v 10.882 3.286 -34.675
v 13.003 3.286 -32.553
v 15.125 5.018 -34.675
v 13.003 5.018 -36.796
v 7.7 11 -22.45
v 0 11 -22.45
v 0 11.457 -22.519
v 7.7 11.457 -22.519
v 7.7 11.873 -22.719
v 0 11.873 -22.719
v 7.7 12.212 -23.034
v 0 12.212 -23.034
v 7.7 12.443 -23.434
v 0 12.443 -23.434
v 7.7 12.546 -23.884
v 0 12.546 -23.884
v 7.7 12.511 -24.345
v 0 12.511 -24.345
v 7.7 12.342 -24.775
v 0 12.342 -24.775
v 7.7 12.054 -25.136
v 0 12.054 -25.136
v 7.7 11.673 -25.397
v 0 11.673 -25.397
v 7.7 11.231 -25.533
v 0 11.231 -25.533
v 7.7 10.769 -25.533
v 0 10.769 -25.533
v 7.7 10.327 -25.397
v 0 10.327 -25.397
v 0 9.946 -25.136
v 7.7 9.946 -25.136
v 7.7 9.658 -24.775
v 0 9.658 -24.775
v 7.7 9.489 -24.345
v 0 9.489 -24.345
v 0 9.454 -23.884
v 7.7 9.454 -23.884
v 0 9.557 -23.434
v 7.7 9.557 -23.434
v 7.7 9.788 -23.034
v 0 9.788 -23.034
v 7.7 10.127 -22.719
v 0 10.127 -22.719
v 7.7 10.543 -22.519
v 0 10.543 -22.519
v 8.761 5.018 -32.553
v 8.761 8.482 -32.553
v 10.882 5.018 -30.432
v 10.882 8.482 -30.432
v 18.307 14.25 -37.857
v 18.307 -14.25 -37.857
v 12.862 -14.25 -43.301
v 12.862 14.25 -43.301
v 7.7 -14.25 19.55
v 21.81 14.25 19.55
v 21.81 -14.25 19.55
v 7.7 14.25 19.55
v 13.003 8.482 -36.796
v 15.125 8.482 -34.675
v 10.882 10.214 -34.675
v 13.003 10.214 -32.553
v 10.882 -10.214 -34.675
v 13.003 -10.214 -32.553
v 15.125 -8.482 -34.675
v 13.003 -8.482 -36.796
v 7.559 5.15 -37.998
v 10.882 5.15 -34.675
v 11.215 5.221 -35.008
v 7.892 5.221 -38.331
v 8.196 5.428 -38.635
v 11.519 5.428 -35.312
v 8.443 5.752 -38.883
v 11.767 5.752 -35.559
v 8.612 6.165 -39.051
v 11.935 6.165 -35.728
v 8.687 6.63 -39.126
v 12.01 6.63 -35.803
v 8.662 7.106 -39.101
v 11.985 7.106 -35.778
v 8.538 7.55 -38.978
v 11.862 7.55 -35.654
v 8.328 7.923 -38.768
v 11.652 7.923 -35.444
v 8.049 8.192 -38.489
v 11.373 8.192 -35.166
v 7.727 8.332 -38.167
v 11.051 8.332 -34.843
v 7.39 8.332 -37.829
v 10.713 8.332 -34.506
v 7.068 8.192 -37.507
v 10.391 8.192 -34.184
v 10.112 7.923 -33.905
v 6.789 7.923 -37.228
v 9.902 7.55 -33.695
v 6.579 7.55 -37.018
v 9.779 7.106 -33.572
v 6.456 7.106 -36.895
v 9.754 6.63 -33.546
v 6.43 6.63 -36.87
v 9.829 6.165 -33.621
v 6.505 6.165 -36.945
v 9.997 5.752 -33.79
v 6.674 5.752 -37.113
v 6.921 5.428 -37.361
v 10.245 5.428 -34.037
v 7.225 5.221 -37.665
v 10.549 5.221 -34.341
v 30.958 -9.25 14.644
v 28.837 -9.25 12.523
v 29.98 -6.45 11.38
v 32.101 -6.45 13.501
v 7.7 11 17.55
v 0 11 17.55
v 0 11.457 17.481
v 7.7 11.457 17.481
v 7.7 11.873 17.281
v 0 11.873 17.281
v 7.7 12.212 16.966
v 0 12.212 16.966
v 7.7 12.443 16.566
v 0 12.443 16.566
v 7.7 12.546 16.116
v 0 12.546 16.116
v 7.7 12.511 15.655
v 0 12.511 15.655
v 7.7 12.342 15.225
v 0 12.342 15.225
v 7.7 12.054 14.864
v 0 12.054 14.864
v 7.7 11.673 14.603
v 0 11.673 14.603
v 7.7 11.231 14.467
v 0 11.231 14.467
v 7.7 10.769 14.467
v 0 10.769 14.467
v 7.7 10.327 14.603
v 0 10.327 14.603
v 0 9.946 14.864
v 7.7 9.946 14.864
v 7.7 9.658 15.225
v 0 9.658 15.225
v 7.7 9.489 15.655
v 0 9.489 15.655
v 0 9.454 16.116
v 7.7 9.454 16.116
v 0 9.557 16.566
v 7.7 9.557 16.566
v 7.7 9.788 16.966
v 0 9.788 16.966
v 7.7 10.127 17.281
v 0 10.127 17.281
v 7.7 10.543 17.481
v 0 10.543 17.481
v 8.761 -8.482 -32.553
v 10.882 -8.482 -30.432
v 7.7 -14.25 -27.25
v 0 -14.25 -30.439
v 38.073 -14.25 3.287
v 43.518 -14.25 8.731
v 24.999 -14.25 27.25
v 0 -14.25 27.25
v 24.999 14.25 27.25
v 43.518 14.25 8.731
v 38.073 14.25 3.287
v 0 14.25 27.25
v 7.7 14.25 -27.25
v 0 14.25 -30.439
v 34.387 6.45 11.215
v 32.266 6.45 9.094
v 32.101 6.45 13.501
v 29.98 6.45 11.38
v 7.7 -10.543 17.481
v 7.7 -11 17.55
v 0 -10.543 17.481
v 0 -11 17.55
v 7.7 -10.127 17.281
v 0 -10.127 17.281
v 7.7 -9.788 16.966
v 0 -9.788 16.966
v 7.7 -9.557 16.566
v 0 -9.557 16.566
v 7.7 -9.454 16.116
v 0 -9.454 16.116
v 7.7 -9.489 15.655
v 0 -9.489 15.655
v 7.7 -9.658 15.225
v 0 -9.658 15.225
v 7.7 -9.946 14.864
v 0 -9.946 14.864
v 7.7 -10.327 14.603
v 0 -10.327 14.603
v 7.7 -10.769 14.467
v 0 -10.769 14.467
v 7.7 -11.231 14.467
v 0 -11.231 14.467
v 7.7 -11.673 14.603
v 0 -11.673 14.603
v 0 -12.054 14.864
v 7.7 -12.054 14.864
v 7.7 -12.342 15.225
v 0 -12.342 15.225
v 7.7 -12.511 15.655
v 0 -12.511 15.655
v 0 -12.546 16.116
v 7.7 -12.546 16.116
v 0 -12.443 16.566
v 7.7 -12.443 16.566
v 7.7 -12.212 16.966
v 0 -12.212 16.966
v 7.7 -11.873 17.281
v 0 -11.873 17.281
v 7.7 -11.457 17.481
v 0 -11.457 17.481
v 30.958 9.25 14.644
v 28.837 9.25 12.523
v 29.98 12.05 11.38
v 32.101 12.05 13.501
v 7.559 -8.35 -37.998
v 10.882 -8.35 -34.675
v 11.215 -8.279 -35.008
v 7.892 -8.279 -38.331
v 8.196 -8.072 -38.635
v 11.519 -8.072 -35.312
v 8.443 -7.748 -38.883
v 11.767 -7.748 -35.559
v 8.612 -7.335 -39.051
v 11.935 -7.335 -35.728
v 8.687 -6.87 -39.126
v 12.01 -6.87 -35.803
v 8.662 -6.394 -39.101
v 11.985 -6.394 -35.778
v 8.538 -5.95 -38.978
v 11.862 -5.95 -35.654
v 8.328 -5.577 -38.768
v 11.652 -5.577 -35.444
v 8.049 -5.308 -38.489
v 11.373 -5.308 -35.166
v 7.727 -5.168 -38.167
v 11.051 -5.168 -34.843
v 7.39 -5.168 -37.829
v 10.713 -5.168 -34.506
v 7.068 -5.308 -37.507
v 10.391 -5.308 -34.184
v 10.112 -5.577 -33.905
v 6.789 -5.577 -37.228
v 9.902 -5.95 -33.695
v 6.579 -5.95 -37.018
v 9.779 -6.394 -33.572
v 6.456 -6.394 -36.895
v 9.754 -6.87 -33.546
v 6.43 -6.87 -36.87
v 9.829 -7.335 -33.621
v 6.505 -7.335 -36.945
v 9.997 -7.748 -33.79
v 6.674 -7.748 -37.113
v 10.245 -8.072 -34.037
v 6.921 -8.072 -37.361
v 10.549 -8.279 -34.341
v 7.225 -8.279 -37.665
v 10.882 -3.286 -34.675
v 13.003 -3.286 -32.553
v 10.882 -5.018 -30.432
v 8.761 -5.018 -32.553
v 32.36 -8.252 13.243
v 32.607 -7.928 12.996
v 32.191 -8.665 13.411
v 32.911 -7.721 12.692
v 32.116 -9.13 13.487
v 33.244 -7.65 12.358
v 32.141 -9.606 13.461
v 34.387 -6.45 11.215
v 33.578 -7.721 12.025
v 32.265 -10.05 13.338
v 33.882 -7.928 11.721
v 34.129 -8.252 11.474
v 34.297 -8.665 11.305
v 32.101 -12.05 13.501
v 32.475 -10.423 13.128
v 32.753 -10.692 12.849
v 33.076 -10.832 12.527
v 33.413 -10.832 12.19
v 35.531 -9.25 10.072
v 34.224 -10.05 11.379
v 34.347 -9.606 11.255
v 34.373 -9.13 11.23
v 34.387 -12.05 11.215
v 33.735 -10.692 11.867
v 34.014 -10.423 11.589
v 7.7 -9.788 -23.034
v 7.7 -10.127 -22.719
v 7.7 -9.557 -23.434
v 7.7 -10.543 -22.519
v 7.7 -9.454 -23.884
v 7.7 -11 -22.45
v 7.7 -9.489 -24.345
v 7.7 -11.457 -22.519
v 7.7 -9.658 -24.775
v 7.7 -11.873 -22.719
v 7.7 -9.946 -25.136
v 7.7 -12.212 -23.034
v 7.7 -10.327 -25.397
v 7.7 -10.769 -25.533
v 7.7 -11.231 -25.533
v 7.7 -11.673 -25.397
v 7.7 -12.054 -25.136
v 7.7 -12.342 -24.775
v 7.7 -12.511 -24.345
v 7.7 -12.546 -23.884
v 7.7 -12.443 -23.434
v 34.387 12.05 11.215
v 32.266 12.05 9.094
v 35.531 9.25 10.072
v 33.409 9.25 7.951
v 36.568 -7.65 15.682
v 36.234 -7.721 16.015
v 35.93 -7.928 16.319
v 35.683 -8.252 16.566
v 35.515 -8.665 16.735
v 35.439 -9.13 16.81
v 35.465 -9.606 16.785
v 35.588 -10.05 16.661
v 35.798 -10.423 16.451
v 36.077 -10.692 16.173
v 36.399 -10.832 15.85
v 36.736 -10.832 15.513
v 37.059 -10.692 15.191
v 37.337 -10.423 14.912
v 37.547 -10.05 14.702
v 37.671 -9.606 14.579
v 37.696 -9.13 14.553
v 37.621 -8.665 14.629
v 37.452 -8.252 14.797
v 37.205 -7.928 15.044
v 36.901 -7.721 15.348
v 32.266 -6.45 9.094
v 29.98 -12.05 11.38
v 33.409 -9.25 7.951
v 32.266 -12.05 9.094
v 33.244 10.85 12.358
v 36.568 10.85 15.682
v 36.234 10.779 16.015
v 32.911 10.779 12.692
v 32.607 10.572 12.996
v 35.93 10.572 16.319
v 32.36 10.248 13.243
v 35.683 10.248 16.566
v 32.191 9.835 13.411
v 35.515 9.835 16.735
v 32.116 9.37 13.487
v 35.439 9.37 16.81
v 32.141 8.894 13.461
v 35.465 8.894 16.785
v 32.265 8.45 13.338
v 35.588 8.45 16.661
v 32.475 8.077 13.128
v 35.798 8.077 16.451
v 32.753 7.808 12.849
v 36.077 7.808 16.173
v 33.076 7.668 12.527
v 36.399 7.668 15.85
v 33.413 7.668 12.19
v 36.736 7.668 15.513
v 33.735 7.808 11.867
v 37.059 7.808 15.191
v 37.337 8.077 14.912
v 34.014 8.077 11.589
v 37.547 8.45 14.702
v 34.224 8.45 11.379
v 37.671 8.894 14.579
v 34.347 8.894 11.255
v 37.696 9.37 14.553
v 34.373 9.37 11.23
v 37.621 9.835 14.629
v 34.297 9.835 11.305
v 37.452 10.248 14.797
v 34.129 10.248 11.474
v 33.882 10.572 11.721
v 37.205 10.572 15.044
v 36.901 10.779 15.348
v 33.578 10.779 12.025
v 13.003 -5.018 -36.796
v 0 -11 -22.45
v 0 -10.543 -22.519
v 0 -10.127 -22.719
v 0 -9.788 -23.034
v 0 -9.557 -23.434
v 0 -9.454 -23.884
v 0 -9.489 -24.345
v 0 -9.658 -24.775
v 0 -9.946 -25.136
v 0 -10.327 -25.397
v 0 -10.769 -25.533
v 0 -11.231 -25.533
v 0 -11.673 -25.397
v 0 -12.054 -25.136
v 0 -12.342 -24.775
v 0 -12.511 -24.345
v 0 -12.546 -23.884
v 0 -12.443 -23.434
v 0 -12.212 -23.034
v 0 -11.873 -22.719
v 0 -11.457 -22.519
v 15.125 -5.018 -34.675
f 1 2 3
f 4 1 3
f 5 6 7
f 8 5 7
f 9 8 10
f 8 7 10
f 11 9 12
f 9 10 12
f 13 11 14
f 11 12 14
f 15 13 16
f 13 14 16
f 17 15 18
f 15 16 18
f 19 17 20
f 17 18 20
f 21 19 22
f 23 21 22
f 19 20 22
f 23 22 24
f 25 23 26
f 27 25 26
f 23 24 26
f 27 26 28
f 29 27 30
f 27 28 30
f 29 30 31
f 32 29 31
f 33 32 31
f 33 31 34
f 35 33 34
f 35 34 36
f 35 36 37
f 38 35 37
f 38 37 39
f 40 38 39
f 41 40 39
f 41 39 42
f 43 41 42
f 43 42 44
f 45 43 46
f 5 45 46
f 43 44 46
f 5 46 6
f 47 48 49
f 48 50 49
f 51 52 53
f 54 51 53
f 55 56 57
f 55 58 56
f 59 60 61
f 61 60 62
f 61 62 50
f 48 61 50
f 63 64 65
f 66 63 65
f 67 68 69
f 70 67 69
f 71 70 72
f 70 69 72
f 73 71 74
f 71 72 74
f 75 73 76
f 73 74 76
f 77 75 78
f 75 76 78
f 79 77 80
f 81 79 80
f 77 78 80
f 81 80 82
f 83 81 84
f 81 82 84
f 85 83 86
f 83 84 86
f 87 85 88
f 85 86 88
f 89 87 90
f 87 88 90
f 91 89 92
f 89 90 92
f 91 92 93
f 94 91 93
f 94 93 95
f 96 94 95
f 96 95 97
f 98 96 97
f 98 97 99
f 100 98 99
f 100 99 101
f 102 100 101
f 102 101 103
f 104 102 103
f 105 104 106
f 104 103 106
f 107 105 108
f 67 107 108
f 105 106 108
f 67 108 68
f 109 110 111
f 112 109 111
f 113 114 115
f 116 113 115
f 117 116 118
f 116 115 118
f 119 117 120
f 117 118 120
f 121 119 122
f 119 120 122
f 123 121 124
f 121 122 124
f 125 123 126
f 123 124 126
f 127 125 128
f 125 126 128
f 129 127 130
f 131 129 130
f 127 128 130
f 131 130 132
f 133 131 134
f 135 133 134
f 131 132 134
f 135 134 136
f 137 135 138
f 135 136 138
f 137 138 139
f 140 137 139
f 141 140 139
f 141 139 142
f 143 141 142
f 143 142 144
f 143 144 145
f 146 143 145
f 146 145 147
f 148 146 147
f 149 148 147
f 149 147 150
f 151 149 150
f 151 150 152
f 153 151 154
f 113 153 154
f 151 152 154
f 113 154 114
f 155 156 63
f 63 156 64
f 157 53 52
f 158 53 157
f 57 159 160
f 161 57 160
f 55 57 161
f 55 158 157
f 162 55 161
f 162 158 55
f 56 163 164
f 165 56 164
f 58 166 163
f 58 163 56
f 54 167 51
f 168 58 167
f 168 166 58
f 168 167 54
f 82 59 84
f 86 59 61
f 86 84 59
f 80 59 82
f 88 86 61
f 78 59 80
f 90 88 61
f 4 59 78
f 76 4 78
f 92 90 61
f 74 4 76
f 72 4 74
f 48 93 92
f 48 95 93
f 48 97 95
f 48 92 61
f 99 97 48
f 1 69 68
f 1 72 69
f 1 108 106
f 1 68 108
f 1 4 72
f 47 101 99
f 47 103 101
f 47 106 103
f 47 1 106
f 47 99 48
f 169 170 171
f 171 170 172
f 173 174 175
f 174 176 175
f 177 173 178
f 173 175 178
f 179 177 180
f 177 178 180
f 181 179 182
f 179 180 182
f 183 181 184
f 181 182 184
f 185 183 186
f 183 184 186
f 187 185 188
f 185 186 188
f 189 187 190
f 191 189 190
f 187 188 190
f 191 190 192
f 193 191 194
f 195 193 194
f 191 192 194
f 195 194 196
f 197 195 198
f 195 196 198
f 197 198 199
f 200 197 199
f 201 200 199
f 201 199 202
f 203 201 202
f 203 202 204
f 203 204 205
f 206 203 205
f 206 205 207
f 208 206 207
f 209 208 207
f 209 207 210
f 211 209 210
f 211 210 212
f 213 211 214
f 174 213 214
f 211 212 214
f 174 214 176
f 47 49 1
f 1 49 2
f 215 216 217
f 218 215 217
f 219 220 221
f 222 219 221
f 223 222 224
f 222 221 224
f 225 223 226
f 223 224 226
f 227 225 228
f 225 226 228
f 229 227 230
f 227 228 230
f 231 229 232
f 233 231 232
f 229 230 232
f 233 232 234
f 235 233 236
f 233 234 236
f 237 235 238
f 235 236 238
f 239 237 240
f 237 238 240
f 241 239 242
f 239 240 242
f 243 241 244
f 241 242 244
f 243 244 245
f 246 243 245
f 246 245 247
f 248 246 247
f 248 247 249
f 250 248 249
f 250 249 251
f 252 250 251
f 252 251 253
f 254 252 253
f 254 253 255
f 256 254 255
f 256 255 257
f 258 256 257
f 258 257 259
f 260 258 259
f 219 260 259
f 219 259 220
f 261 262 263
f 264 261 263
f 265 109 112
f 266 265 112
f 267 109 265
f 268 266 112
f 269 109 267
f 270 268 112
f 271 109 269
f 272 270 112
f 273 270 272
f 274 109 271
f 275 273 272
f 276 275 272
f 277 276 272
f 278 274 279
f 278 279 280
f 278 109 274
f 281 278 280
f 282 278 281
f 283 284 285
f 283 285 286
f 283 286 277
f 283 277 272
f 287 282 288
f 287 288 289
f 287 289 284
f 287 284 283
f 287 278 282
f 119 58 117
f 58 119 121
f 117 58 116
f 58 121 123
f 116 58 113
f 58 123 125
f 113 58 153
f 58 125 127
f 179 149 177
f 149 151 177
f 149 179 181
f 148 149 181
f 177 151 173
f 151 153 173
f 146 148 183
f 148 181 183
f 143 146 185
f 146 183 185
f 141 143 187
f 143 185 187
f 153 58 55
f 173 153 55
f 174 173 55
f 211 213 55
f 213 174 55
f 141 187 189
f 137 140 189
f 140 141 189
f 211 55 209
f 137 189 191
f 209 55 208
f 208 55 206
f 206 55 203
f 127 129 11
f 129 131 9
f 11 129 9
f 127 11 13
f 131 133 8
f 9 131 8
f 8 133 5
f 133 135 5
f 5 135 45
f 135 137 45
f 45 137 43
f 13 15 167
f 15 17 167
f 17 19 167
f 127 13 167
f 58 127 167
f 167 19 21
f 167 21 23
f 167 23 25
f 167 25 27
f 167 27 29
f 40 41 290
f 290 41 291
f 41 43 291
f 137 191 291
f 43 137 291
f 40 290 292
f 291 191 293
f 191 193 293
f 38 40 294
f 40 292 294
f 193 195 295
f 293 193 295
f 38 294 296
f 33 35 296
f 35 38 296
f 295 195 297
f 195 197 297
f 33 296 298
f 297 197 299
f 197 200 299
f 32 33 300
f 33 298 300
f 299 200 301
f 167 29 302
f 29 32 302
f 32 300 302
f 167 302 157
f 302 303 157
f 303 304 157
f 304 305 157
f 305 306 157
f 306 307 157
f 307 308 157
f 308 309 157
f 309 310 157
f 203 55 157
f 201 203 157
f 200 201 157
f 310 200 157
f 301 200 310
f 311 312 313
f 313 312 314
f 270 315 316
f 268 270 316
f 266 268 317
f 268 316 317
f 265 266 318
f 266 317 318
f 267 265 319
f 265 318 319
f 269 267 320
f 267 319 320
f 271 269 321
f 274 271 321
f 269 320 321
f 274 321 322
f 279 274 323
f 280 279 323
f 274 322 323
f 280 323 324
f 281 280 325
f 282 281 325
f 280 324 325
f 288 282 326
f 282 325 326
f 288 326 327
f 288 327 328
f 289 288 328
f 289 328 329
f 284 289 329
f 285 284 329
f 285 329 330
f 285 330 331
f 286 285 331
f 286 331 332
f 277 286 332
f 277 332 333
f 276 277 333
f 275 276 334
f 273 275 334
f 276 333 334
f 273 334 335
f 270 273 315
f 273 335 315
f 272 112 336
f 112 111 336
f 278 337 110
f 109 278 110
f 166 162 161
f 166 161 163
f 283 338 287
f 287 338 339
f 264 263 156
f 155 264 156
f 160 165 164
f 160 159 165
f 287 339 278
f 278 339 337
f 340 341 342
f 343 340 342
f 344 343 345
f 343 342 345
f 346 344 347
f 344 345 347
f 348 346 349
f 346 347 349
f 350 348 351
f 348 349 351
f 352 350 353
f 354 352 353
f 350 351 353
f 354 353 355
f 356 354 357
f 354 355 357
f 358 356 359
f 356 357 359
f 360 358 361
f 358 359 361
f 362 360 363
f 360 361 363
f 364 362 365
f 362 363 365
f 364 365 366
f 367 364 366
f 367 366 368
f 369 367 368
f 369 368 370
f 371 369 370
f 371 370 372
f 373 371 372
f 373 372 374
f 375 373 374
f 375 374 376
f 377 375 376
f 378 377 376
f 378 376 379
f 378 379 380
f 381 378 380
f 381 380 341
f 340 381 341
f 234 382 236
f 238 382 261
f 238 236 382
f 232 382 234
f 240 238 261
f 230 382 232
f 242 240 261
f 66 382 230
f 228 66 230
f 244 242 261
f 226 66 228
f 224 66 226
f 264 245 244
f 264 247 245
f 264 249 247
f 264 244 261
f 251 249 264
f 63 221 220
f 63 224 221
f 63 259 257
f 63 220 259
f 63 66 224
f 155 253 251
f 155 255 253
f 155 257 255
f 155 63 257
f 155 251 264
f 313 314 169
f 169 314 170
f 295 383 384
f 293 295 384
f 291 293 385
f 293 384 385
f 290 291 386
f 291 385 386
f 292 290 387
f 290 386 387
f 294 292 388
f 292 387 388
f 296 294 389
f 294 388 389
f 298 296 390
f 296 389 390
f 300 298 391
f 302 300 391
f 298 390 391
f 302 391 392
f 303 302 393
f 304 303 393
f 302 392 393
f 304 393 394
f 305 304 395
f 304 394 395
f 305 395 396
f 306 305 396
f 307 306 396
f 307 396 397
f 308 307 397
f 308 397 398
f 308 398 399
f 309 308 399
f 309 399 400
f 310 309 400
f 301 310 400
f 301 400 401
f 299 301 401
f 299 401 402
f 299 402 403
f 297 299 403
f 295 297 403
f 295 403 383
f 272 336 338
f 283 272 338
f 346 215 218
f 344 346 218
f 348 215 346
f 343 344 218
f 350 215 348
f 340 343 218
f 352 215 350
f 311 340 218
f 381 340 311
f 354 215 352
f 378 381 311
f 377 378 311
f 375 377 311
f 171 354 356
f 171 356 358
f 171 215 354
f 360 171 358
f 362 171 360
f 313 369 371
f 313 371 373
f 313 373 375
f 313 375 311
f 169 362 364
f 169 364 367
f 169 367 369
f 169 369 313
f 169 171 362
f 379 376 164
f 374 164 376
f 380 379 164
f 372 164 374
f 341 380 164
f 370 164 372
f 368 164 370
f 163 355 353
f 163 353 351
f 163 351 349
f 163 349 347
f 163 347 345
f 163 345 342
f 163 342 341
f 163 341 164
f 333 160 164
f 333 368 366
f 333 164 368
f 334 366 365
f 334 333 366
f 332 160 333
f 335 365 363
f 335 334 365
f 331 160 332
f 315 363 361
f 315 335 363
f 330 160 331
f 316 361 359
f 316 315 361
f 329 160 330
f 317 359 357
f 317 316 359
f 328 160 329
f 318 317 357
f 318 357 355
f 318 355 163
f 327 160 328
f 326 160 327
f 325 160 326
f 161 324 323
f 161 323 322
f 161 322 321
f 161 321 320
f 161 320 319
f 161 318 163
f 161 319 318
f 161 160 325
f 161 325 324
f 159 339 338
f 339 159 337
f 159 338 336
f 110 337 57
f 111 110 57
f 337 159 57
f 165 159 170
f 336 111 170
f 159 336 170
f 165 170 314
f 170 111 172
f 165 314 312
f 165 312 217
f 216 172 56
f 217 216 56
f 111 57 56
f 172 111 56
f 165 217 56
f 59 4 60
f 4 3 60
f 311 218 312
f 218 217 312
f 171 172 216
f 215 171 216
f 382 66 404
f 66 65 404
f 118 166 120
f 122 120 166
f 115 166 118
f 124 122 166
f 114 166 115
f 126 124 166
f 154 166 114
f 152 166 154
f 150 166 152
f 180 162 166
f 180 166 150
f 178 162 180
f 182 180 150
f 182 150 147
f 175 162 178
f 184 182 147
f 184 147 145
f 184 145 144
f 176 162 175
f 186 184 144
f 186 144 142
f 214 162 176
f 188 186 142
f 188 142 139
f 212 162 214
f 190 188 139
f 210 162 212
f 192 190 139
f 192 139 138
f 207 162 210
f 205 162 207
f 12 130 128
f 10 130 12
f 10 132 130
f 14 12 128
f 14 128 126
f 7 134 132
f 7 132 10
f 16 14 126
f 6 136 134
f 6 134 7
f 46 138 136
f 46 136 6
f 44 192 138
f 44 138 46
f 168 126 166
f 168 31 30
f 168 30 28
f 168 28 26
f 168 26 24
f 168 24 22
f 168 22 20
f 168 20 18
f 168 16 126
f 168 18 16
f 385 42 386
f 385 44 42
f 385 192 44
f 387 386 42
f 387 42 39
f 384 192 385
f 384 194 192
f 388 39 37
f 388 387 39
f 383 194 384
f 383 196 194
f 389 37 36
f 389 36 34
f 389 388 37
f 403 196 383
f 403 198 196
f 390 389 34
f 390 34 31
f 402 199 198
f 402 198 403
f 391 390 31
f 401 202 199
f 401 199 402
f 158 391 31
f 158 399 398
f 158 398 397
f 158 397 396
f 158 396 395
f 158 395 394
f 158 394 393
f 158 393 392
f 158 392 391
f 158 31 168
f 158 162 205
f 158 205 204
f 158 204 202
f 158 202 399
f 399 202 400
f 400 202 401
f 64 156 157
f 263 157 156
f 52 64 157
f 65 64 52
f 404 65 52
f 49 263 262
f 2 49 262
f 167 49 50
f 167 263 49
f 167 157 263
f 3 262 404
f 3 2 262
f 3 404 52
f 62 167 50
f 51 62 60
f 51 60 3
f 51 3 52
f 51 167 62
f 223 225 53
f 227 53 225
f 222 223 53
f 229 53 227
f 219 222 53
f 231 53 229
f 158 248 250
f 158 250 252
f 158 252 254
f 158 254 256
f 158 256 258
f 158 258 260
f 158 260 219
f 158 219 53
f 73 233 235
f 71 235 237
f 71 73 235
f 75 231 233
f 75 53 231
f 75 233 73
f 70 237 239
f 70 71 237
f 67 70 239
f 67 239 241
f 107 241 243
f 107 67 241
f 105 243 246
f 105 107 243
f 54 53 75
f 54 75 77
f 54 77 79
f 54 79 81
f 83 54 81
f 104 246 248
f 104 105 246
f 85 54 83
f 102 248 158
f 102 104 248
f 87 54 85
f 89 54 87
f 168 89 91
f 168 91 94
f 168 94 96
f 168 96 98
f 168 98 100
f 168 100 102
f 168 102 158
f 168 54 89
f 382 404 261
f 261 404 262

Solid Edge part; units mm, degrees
sketch "Sketch1" plane through (0, 0, 0) normal (1, 0, 0) x (0, 1, 0)
  line L0 (-14.25, -27.25) -> (-14.25, 27.25)
  line L1 (-14.25, 27.25) -> (14.25, 27.25)
  line L2 (14.25, 27.25) -> (14.25, -27.25)
  line L3 (14.25, -27.25) -> (-14.25, -27.25)
extrude "Protrusion1" add sketch "Sketch1" along normal blind 7.7
sketch "Sketch2" plane through (7.7, 0, 0) normal (1, 0, 0) x (0, 1, 0)
  line L0 (14.25, 19.55) -> (-14.25, 19.55)
  line L1 (-14.25, 19.55) -> (-14.25, 27.25)
  line L2 (-14.25, 27.25) -> (14.25, 27.25)
  line L3 (14.25, 27.25) -> (14.25, 19.55)
extrude "Extrusionsausprägung_2" add sketch "Sketch2" along normal blind 14.11
hole "Bohrung_1" at (0, 11, -24) direction (1, 0, 0) diameter 3.1 end through all
pattern_linear "Pattern1" count 2 spacing 22 along (0, -1, 0) count 2 spacing 40 along (0, 0, 1) of "Bohrung_1"
draft "Formschräge_3" angle 45 neutral plane through (18.75, 0, 19.55) normal (0, 0, -1) pull direction (0, 0, -1) face at (21.81, 9.215, 26.0437)
sketch "Sketch3" plane through (29.505, 0, 27.245) normal (0.7071068, 0, -0.7071068) x (0, 1, 0)
  line L0 (-14.25, -10.8824) -> (14.25, -10.8824)
  line L1 (14.25, -10.8824) -> (14.25, -3.1824)
  line L2 (14.25, -3.1824) -> (-14.25, -3.1824)
  line L3 (-14.25, -3.1824) -> (-14.25, -10.8824)
  dimension "D1" = 28.5
  dimension "D2" = 7.7
extrude "Extrusionsausprägung_3" add sketch "Sketch3" along normal blind 23
sketch "Sketch4" plane through (32.5061, -14.25, 0) normal (0, -1, 0) x (1, 0, 0)
  line L0 (-5.2514, 24.9947) -> (-7.5067, 27.25)
extrude "Cutout1" cut sketch "Sketch4" against normal through all material side at (26.1624, -14.25, 26.1577)
hole "Bohrung_10" at (31.123, -9.25, 10.237) direction (0.7071068, 0, 0.7071068) diameter 3.2 end up to next
hole "Hole1" at (31.123, 9.25, 10.237) direction (0.7071068, 0, 0.7071068) diameter 3.2 end up to next
sketch "Sketch5" plane through (28.8811, 0, 12.4789) normal (-0.7071068, 0, -0.7071068) x (0.7071068, 0, -0.7071068)
  line L0 (4.7872, 12.05) -> (1.554, 12.05)
  line L1 (1.554, 12.05) -> (-0.0626, 9.25)
  line L2 (-0.0626, 9.25) -> (1.554, 6.45)
  line L3 (1.554, 6.45) -> (4.7872, 6.45)
  line L4 (4.7872, 6.45) -> (6.4038, 9.25)
  line L5 (6.4038, 9.25) -> (4.7872, 12.05)
  dimension "D1" = 5.6
extrude "Extrusionsausschnitt_2" cut sketch "Sketch5" against normal blind 3
sketch "Sketch6" plane through (28.8811, 0, 12.4789) normal (-0.7071068, 0, -0.7071068) x (0.7071068, 0, -0.7071068)
  line L0 (4.7872, -12.05) -> (6.4038, -9.25)
  line L1 (6.4038, -9.25) -> (4.7872, -6.45)
  line L2 (4.7872, -6.45) -> (1.554, -6.45)
  line L3 (1.554, -6.45) -> (-0.0626, -9.25)
  line L4 (-0.0626, -9.25) -> (1.554, -12.05)
  line L5 (1.554, -12.05) -> (4.7872, -12.05)
  dimension "D1" = 5.6
extrude "Extrusionsausschnitt_3" cut sketch "Sketch6" against normal blind 3
sketch "Sketch7" plane through (0, 0, 0) normal (0, -1, 0) x (1, 0, 0)
  line L0 (7.7, -27.25) -> (18.3066, -37.8566)
  line L1 (18.3066, -37.8566) -> (12.8619, -43.3013)
  line L2 (12.8619, -43.3013) -> (0, -30.4394)
  line L3 (0, -30.4394) -> (0, -27.25)
  line L4 (0, -27.25) -> (7.7, -27.25)
extrude "Extrusionsausprägung_14" add sketch "Sketch7" along normal mid plane 28.5
sketch "Sketch8" plane through (13.0033, 0, -32.5533) normal (0.7071068, 0, 0.7071068) x (0.7071068, 0, -0.7071068)
  line L0 (3, 5.0179) -> (3, 8.4821)
  line L1 (3, 8.4821) -> (0, 10.2141)
  line L2 (0, 10.2141) -> (-3, 8.4821)
  line L3 (-3, 8.4821) -> (-3, 5.0179)
  line L4 (-3, 5.0179) -> (0, 3.2859)
  line L5 (0, 3.2859) -> (3, 5.0179)
  line L6 (3, -8.4821) -> (3, -5.0179)
  line L7 (3, -5.0179) -> (0, -3.2859)
  line L8 (0, -3.2859) -> (-3, -5.0179)
  line L9 (-3, -5.0179) -> (-3, -8.4821)
  line L10 (-3, -8.4821) -> (0, -10.2141)
  line L11 (0, -10.2141) -> (3, -8.4821)
extrude "Extrusionsausschnitt_6" cut sketch "Sketch8" against normal blind 3
hole "Bohrung_12" at (13.0033, 6.75, -32.5533) direction (-0.7071068, 0, -0.7071068) diameter 3.2 end up to next
hole "Hole2" at (13.0033, -6.75, -32.5533) direction (-0.7071068, 0, -0.7071068) diameter 3.2 end up to next
hole "Hole3" [suppressed]
hole "Hole4" [suppressed]
properties material "Finger_Unterbau"
